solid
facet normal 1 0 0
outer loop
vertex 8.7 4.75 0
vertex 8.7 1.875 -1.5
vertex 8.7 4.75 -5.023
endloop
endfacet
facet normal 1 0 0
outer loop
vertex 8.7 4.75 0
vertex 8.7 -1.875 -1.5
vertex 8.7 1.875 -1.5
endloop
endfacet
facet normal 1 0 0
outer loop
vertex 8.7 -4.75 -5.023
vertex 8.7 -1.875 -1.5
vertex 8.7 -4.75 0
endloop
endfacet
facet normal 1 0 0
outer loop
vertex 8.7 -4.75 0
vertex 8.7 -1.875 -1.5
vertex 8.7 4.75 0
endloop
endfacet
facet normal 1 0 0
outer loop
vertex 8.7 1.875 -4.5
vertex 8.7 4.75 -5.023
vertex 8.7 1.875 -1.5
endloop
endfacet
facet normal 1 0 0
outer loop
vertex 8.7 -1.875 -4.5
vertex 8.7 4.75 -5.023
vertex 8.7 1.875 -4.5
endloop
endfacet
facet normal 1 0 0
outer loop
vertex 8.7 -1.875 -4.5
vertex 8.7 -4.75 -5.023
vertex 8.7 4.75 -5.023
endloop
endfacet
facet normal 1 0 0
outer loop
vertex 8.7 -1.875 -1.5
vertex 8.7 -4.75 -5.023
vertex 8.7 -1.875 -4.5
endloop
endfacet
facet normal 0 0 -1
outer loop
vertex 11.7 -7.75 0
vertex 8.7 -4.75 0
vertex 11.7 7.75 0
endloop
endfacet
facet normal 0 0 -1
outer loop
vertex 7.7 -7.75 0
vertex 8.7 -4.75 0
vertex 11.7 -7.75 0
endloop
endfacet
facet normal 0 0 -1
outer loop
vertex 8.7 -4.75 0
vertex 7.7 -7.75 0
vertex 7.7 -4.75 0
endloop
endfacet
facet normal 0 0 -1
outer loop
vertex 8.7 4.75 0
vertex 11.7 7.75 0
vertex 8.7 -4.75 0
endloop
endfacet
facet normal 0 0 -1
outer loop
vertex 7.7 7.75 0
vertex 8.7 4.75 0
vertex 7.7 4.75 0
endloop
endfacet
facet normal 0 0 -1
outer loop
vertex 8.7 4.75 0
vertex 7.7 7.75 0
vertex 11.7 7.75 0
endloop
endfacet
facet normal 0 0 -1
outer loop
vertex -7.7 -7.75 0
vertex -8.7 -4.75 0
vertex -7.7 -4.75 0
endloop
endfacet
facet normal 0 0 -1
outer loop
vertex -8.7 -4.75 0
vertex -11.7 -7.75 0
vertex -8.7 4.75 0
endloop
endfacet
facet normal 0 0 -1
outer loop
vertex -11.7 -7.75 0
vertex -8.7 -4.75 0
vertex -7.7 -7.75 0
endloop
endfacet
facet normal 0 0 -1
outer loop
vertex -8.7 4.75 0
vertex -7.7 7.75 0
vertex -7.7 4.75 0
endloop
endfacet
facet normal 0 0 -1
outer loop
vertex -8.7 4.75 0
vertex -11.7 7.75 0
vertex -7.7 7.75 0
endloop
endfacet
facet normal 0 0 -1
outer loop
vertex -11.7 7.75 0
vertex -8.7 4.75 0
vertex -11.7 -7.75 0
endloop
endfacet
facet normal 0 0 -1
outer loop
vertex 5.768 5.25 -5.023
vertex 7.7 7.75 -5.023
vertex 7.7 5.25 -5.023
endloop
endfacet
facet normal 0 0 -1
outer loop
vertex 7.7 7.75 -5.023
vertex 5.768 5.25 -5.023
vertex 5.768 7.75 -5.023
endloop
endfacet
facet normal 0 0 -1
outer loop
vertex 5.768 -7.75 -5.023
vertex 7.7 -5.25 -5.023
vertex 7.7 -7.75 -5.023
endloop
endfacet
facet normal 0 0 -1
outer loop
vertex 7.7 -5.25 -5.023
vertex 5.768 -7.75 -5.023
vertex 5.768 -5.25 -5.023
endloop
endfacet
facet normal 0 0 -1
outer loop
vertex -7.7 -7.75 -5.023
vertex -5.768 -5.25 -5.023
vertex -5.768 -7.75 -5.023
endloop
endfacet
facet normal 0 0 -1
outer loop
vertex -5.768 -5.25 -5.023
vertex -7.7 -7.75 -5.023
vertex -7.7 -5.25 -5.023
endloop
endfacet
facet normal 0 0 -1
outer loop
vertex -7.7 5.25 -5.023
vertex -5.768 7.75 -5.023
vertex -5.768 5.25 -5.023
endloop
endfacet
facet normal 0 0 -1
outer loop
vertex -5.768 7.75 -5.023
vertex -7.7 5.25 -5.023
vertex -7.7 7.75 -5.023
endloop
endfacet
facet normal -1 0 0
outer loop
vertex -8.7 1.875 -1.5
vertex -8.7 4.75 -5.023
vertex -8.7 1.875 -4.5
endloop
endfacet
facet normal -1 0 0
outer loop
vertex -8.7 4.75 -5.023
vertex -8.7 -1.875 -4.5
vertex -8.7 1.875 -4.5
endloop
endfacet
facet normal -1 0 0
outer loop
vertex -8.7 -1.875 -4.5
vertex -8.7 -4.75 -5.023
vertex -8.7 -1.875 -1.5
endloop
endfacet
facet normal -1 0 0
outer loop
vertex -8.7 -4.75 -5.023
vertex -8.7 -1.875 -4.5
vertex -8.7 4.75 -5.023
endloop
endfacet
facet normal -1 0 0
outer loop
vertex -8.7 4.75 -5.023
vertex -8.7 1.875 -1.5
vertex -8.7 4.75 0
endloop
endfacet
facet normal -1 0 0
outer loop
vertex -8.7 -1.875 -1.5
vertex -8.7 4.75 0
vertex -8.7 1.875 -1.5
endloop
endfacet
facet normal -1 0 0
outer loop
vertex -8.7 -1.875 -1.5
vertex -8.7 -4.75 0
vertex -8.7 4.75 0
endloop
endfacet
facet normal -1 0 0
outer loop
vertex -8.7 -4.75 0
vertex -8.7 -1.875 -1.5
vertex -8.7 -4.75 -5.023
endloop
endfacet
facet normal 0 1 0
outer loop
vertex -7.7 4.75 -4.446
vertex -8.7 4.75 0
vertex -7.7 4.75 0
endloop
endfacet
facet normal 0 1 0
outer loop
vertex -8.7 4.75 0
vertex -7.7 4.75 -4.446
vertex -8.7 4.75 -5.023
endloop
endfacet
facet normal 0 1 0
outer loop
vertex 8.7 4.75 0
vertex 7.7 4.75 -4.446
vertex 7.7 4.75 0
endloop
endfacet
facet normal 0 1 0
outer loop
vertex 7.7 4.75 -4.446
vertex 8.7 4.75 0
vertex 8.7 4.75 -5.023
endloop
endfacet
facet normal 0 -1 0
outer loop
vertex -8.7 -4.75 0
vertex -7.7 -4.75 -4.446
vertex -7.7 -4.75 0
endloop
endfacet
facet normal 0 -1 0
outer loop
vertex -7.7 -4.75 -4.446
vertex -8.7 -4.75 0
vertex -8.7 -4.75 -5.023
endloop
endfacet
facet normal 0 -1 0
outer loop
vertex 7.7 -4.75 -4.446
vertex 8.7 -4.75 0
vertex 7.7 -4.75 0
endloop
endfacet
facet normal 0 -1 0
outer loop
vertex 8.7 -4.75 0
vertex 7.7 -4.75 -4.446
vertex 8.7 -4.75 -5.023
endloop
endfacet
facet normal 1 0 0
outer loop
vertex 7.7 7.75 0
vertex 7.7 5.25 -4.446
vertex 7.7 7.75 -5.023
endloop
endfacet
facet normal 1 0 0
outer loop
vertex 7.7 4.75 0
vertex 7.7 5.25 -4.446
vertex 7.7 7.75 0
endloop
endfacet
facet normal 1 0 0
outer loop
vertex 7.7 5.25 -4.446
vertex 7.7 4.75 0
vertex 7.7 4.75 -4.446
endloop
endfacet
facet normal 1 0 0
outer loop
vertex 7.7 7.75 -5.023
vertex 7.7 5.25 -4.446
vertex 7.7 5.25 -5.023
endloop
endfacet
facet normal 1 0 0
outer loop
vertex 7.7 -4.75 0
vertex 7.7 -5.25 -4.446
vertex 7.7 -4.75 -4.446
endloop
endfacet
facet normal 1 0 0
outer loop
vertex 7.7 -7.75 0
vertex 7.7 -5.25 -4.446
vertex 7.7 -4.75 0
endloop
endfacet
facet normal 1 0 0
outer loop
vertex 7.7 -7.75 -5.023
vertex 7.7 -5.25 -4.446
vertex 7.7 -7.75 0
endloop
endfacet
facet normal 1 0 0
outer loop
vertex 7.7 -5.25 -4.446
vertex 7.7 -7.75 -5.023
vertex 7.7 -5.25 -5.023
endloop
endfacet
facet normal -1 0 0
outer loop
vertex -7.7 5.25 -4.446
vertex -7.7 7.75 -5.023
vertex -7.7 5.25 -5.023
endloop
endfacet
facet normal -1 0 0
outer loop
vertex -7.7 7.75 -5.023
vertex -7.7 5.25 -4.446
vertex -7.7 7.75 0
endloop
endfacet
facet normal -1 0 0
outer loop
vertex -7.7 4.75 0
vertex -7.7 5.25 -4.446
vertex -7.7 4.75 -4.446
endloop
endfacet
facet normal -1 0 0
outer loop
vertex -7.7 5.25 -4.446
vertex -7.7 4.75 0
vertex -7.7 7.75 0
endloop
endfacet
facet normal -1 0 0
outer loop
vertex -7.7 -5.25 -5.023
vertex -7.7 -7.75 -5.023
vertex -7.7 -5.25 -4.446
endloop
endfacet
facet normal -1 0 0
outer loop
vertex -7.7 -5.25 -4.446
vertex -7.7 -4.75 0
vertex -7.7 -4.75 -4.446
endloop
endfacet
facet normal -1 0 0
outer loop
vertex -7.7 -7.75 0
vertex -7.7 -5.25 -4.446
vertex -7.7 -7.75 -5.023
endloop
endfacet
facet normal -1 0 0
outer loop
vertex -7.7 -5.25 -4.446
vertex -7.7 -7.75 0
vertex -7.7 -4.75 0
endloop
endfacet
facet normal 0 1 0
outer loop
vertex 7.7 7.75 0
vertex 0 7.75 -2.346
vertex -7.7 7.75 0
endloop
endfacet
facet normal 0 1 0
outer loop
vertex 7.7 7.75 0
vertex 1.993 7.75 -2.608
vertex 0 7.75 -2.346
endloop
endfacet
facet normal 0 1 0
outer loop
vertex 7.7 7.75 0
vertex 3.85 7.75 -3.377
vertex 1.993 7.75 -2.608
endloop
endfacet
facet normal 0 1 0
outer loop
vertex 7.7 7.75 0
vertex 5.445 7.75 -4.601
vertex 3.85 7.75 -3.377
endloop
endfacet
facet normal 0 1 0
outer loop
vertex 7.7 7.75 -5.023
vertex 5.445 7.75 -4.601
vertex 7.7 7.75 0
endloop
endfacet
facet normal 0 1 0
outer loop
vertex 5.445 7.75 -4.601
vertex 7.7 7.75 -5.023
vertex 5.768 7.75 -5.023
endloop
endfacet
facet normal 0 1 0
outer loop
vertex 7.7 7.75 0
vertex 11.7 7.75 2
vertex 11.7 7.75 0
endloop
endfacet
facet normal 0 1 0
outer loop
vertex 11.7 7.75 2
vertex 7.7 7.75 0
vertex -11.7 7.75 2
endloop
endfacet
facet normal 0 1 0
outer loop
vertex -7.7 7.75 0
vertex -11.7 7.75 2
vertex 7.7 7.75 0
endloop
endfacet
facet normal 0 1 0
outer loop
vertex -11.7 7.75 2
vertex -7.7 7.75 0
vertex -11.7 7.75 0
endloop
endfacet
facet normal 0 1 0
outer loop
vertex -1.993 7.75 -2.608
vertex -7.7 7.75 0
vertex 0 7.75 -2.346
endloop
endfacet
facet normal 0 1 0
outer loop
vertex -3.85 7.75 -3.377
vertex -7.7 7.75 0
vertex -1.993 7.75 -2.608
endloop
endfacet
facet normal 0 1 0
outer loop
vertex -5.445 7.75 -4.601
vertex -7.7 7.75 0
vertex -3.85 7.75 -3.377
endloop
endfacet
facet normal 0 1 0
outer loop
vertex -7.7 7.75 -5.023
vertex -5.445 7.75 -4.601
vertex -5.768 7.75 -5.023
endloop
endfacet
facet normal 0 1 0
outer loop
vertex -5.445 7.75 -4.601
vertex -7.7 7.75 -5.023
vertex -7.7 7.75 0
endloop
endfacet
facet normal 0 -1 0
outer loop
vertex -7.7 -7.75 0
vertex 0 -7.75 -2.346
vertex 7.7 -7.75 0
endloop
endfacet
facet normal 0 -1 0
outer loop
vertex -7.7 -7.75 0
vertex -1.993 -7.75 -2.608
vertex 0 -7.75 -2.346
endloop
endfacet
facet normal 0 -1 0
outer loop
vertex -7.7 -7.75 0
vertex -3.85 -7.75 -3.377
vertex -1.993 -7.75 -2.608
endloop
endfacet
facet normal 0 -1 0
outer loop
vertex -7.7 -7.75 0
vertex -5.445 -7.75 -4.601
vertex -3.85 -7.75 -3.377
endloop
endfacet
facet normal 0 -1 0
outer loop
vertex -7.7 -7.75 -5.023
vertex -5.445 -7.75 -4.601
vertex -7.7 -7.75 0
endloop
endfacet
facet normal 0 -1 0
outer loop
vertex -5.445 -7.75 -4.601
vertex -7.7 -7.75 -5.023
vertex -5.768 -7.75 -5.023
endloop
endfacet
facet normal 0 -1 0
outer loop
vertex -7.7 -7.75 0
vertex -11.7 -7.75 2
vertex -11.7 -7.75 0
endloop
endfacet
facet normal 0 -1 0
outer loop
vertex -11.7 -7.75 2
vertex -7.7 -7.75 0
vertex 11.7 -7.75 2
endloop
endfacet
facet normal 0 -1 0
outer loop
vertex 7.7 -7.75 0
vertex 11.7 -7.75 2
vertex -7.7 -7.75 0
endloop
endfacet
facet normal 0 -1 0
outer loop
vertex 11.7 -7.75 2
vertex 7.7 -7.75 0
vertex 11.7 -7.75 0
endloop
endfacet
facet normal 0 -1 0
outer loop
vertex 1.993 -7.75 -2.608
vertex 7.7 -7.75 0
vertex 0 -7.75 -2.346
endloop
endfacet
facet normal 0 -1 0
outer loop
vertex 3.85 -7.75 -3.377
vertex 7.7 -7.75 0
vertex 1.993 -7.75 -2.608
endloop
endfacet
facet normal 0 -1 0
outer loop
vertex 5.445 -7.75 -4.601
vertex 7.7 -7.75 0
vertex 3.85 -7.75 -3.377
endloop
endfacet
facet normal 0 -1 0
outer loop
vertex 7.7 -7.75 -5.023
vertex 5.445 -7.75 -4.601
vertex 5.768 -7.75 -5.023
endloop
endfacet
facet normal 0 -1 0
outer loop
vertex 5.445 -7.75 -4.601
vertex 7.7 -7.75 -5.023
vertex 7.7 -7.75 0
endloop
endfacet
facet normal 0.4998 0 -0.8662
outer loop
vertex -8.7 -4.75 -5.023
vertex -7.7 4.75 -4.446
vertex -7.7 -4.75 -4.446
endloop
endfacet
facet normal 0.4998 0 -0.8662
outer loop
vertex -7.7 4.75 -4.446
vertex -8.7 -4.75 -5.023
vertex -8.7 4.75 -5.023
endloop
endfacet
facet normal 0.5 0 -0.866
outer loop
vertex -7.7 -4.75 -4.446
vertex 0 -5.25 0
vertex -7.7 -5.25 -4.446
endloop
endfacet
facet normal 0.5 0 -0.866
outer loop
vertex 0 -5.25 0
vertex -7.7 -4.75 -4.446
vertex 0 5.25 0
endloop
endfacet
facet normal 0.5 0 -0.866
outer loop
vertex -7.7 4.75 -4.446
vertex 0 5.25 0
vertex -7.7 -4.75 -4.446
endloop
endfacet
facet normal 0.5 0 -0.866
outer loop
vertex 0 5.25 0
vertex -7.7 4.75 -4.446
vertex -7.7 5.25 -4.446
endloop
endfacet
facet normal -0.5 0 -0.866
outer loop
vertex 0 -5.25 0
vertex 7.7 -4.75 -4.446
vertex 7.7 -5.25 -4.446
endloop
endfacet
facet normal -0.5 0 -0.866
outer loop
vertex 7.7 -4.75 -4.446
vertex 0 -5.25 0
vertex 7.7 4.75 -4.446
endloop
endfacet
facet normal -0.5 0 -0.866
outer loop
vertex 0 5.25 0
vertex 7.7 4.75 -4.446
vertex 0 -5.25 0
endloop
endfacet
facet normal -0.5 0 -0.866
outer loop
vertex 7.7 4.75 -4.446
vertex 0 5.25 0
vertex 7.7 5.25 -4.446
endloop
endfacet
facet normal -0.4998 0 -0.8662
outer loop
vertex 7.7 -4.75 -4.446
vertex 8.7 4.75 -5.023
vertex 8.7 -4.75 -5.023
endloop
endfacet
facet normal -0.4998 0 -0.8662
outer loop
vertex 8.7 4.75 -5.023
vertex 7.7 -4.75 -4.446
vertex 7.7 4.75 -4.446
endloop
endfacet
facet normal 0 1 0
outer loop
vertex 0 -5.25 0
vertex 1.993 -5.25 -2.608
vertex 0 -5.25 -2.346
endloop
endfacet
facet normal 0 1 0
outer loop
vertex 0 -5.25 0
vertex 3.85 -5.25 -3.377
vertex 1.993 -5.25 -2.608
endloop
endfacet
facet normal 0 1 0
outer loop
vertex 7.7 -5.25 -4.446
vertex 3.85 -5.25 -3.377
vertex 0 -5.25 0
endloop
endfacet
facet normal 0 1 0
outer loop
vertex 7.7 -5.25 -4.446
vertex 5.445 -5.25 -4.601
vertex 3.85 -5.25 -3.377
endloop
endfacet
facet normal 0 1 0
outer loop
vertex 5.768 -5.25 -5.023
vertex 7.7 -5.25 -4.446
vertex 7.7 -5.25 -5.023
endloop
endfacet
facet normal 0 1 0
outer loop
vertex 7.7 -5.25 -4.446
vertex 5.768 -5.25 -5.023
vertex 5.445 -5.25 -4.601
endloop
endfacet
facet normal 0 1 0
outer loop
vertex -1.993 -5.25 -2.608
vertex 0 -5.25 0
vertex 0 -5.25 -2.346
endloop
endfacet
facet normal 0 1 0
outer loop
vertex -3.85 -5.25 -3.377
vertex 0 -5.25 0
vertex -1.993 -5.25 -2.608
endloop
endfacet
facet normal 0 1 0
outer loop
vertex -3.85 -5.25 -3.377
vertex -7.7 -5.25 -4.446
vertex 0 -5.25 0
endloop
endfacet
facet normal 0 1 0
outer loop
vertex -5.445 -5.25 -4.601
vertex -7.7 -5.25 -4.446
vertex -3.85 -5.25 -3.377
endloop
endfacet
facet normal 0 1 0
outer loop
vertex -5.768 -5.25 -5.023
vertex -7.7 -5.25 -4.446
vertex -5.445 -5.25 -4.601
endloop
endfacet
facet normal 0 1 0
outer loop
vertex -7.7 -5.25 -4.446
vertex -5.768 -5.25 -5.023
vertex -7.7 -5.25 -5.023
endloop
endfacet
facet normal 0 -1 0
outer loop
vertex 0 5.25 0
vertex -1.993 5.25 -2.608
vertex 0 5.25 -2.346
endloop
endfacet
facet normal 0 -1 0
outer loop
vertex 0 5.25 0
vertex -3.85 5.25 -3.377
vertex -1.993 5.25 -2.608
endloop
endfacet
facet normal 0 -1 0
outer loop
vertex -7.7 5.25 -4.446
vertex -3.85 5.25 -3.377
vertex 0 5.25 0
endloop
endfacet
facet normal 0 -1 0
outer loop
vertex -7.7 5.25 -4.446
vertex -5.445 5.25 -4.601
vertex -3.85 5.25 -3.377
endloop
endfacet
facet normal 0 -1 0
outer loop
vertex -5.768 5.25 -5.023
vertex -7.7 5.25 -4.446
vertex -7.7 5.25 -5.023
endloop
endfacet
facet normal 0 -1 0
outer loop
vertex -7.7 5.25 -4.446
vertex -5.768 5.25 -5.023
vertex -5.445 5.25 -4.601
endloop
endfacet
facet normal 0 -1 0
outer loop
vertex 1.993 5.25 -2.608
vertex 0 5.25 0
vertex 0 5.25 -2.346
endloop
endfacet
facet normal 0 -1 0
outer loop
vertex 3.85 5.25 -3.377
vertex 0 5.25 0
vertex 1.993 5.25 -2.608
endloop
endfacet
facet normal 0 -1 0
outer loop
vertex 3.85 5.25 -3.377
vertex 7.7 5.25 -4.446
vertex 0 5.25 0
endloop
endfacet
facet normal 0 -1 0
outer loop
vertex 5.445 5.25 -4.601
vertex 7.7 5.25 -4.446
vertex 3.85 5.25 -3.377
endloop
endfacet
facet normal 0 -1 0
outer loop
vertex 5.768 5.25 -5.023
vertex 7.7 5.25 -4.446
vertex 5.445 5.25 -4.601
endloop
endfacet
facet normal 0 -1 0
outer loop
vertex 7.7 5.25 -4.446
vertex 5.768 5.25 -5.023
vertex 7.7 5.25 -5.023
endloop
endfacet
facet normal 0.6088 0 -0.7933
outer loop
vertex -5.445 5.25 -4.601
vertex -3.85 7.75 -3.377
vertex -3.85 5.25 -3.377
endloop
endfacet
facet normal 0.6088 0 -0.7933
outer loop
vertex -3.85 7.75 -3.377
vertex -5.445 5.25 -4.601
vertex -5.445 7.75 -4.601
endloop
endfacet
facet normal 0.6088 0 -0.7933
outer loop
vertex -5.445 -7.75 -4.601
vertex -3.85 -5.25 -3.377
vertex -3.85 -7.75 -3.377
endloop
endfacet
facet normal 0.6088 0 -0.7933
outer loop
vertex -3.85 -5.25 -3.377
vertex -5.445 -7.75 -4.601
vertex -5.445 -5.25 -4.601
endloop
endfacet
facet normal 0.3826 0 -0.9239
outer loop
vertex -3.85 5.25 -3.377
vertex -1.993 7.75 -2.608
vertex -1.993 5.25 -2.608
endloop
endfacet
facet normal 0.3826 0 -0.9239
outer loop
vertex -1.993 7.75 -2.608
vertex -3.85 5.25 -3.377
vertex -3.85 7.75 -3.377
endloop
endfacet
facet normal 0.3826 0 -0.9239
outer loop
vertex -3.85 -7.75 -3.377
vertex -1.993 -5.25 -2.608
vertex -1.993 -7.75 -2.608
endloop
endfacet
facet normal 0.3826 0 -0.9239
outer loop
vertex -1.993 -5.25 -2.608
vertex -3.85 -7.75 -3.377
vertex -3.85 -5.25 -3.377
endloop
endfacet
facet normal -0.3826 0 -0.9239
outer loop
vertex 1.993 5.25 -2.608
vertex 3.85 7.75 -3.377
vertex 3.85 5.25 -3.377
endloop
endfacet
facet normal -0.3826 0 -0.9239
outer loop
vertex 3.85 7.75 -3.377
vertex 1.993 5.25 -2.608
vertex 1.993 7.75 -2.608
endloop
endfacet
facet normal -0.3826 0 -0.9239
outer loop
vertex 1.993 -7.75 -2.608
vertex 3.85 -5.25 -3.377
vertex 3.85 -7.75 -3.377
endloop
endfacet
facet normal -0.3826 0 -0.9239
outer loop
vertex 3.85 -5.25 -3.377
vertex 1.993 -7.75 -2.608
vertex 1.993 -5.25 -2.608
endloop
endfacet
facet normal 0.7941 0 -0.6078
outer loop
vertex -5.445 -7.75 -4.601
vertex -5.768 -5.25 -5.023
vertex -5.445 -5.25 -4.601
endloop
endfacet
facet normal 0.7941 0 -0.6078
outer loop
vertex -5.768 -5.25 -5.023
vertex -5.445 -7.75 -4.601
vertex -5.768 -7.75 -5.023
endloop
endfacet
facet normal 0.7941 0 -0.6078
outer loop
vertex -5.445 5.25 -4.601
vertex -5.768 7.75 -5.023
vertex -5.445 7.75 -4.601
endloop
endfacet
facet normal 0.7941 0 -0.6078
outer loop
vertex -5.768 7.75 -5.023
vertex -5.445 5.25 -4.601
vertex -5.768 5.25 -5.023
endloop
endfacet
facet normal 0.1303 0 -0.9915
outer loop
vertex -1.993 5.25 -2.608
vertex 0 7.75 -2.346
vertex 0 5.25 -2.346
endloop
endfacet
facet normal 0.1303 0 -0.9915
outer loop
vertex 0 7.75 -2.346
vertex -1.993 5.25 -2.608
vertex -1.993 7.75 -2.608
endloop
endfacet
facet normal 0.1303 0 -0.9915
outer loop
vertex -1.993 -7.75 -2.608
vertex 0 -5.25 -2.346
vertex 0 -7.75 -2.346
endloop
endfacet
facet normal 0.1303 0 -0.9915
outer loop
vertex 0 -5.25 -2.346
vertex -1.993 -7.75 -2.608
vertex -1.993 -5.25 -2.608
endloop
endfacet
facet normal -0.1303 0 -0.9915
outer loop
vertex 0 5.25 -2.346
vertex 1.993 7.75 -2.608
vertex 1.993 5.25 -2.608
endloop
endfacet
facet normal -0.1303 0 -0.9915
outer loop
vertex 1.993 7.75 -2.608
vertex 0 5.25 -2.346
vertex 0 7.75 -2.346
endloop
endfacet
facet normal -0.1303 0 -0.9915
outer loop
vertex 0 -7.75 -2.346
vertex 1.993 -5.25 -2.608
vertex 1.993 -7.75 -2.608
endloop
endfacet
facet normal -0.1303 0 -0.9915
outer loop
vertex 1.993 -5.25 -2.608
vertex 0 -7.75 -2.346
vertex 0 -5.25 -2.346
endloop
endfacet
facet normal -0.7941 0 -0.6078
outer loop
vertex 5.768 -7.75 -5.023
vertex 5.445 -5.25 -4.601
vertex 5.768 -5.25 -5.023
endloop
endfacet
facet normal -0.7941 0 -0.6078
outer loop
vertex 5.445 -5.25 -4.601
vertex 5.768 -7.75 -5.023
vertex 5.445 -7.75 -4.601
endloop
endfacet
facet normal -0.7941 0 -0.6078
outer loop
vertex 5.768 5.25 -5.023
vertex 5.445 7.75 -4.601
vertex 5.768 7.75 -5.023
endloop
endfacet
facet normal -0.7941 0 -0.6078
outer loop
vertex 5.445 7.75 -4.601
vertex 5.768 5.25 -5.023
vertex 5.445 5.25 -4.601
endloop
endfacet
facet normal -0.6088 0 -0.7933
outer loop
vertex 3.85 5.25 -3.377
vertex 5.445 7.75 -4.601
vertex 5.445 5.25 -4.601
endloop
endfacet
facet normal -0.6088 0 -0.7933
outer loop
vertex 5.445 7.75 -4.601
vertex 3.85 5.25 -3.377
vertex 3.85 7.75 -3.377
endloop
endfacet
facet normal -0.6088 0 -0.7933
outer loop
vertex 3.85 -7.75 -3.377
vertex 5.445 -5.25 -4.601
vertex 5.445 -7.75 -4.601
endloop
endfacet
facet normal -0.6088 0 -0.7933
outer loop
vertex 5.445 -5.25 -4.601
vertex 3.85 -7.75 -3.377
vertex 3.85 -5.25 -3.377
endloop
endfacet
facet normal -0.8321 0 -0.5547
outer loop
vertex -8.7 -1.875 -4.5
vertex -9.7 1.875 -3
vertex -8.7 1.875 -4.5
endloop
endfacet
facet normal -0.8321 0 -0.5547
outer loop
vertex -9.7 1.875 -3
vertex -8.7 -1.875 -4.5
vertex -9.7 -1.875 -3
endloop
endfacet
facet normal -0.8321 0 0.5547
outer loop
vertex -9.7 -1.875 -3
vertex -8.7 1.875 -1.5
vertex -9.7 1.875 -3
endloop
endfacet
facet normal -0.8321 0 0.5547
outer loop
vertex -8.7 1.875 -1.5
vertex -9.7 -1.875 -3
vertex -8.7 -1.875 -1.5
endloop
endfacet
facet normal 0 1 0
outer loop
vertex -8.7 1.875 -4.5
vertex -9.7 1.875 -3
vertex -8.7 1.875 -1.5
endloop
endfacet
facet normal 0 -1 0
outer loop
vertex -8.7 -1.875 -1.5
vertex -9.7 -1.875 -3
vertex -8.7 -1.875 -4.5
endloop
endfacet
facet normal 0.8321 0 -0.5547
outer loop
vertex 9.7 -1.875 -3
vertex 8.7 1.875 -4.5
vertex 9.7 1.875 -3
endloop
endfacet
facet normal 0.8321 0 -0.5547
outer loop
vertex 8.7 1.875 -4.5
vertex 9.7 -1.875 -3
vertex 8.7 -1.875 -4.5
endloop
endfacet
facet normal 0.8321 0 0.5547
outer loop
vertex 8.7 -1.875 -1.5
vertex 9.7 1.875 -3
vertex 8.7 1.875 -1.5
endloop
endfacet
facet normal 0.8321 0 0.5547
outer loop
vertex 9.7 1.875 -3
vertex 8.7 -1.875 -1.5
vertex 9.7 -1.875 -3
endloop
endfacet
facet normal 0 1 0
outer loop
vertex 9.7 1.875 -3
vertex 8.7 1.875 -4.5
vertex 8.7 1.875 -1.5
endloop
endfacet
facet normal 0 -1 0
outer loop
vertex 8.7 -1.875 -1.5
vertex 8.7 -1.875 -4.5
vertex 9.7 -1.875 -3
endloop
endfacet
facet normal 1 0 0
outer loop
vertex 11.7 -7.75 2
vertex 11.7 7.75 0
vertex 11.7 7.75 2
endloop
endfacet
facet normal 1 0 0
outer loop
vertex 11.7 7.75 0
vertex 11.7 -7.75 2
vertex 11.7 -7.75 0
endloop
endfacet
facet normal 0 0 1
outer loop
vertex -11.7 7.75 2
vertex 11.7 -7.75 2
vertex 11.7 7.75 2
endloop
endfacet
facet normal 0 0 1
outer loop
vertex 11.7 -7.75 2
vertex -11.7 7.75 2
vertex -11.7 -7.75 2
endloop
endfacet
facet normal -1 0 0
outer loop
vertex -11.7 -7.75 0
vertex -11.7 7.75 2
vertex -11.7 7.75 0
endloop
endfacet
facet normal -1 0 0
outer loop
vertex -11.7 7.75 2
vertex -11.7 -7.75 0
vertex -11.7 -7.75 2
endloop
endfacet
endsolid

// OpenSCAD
// file: config.scad
snappy_version = 0.90;


platform_length = 110; // mm.  Must be a multiple of rack_tooth_size.
platform_width  = 150; // mm
platform_height =  40; // mm
platform_thick  =   7; // mm

rail_length  = 150;    // mm
rail_height  =  50;    // mm
rail_thick   =   7;    // mm

motor_rail_length = 100; // mm

roller_thick =  12;    // mm
roller_diam  =  30;    // mm
roller_axle  =  15;    // mm
roller_base  =  12;    // mm
roller_angle =  30;    // degrees

joiner_angle =  30;    // degrees
joiner_width =  10;    // mm

rack_tooth_size  =  5; // mm per tooth.
set_screw_size   =  3; // mm size of set screw in drive gears, couplers, etc
motor_shaft_size =  5; // mm
motor_shaft_flatted = false;  // boolean

// Currently configured for 3/8" ACME threaded rod and matching 11/16" nut
lifter_rod_diam   =   9.5; // mm
lifter_rod_length = 300.0; // mm
lifter_nut_size   =  17.4; // mm
lifter_nut_thick  =   9.3; // mm
lifter_thread_size =  3.175; // mm lift per revolution

// This is the slop needed to make parts fit more exactly, and may be
// printer dependant.  Printing a slop calibration plate should help
// dial this setting in for your printer.
printer_slop =   0.25; // mm



// Commonly used derived values.  Don't change these.
rail_spacing = platform_width - joiner_width*4 - 10;
roller_spacing = rail_spacing-roller_diam+0.5;
rail_width = rail_spacing + joiner_width*2;



// vim: noexpandtab tabstop=4 shiftwidth=4 softtabstop=4 nowrap
// main file
include <config.scad>
use <GDMUtils.scad>

module nut_capture(nut_size=17.4, nut_thick=9.5, offset=18, slop=printer_slop, wall=3)
{
	nut_rad = nut_size/cos(30)/2;
	base = (offset - nut_rad);
	h = nut_rad*2 + base;
	w = nut_thick + wall*2;
	l = nut_size + wall*2;

	difference() {
		// Outer shell.
		translate([0, 0, h/2])
			cube(size=[l, w, h], center=true);

		translate([0, 0, base+nut_rad]) {
			// Nut slot.
			hull() {
				grid_of(za=[0, h]) {
					zrot(90) yrot(90) {
						cylinder(h=nut_thick+slop*2, r=nut_rad+slop, center=true, $fn=6);
					}
				}
			}
		
			// Rod access.
			hull() {
				grid_of(za=[0, h]) {
					zrot(90) yrot(90) {
						cylinder(h=w+1, r=nut_size/2-1, center=true, $fn=24);
					}
				}
			}
		}

		// Snap hole.
		translate([0, 0, h-3])
			cube(size=[l+1, nut_thick/2, 1.5], center=true);
	}
}
//!nut_capture(nut_size=17.4, nut_thick=9.5);



module nut_capture_cap(nut_size=17.4, nut_thick=9.5, wall=3, cap_thick=2)
{
	nut_rad = nut_size/cos(30)/2;
	h = nut_rad/2;
	l = nut_size + wall*2;
	w = nut_thick + wall*2;

	color("DeepSkyBlue") union() {
		// cap
		translate([0, 0, cap_thick/2])
			cube(size=[l, w, cap_thick], center=true);

		difference() {
			// Plug
			union() {
				translate([0, 0, -h/2])
					cube(size=[nut_size, nut_thick, h], center=true);
				translate([0, 0, -h/2])
					cube(size=[nut_size-2, w, h], center=true);
			}

			// Remove nut area.
			translate([0, 0, -nut_rad]) {
				zrot(90) yrot(90) {
					cylinder(h=nut_thick+1, r=nut_rad, center=true, $fn=6);
				}
			}

			// Remove Rod access.
			translate([0, 0, -nut_rad]) {
				zrot(90) yrot(90) {
					cylinder(h=w+1, r=nut_size/2-1, center=true, $fn=24);
				}
			}
		}

		// Snap ridges
		grid_of(
			xa=[-nut_size/2, nut_size/2],
			za=[-3]
		) {
			scale([2.0, nut_thick/2-1, 3.0])
				yrot(45) cube(size=[1/sqrt(2), 1, 1/sqrt(2)], center=true);
		}
	}
}
!nut_capture_cap(nut_size=17.4, nut_thick=9.5);



// vim: noexpandtab tabstop=4 shiftwidth=4 softtabstop=4 nowrap
